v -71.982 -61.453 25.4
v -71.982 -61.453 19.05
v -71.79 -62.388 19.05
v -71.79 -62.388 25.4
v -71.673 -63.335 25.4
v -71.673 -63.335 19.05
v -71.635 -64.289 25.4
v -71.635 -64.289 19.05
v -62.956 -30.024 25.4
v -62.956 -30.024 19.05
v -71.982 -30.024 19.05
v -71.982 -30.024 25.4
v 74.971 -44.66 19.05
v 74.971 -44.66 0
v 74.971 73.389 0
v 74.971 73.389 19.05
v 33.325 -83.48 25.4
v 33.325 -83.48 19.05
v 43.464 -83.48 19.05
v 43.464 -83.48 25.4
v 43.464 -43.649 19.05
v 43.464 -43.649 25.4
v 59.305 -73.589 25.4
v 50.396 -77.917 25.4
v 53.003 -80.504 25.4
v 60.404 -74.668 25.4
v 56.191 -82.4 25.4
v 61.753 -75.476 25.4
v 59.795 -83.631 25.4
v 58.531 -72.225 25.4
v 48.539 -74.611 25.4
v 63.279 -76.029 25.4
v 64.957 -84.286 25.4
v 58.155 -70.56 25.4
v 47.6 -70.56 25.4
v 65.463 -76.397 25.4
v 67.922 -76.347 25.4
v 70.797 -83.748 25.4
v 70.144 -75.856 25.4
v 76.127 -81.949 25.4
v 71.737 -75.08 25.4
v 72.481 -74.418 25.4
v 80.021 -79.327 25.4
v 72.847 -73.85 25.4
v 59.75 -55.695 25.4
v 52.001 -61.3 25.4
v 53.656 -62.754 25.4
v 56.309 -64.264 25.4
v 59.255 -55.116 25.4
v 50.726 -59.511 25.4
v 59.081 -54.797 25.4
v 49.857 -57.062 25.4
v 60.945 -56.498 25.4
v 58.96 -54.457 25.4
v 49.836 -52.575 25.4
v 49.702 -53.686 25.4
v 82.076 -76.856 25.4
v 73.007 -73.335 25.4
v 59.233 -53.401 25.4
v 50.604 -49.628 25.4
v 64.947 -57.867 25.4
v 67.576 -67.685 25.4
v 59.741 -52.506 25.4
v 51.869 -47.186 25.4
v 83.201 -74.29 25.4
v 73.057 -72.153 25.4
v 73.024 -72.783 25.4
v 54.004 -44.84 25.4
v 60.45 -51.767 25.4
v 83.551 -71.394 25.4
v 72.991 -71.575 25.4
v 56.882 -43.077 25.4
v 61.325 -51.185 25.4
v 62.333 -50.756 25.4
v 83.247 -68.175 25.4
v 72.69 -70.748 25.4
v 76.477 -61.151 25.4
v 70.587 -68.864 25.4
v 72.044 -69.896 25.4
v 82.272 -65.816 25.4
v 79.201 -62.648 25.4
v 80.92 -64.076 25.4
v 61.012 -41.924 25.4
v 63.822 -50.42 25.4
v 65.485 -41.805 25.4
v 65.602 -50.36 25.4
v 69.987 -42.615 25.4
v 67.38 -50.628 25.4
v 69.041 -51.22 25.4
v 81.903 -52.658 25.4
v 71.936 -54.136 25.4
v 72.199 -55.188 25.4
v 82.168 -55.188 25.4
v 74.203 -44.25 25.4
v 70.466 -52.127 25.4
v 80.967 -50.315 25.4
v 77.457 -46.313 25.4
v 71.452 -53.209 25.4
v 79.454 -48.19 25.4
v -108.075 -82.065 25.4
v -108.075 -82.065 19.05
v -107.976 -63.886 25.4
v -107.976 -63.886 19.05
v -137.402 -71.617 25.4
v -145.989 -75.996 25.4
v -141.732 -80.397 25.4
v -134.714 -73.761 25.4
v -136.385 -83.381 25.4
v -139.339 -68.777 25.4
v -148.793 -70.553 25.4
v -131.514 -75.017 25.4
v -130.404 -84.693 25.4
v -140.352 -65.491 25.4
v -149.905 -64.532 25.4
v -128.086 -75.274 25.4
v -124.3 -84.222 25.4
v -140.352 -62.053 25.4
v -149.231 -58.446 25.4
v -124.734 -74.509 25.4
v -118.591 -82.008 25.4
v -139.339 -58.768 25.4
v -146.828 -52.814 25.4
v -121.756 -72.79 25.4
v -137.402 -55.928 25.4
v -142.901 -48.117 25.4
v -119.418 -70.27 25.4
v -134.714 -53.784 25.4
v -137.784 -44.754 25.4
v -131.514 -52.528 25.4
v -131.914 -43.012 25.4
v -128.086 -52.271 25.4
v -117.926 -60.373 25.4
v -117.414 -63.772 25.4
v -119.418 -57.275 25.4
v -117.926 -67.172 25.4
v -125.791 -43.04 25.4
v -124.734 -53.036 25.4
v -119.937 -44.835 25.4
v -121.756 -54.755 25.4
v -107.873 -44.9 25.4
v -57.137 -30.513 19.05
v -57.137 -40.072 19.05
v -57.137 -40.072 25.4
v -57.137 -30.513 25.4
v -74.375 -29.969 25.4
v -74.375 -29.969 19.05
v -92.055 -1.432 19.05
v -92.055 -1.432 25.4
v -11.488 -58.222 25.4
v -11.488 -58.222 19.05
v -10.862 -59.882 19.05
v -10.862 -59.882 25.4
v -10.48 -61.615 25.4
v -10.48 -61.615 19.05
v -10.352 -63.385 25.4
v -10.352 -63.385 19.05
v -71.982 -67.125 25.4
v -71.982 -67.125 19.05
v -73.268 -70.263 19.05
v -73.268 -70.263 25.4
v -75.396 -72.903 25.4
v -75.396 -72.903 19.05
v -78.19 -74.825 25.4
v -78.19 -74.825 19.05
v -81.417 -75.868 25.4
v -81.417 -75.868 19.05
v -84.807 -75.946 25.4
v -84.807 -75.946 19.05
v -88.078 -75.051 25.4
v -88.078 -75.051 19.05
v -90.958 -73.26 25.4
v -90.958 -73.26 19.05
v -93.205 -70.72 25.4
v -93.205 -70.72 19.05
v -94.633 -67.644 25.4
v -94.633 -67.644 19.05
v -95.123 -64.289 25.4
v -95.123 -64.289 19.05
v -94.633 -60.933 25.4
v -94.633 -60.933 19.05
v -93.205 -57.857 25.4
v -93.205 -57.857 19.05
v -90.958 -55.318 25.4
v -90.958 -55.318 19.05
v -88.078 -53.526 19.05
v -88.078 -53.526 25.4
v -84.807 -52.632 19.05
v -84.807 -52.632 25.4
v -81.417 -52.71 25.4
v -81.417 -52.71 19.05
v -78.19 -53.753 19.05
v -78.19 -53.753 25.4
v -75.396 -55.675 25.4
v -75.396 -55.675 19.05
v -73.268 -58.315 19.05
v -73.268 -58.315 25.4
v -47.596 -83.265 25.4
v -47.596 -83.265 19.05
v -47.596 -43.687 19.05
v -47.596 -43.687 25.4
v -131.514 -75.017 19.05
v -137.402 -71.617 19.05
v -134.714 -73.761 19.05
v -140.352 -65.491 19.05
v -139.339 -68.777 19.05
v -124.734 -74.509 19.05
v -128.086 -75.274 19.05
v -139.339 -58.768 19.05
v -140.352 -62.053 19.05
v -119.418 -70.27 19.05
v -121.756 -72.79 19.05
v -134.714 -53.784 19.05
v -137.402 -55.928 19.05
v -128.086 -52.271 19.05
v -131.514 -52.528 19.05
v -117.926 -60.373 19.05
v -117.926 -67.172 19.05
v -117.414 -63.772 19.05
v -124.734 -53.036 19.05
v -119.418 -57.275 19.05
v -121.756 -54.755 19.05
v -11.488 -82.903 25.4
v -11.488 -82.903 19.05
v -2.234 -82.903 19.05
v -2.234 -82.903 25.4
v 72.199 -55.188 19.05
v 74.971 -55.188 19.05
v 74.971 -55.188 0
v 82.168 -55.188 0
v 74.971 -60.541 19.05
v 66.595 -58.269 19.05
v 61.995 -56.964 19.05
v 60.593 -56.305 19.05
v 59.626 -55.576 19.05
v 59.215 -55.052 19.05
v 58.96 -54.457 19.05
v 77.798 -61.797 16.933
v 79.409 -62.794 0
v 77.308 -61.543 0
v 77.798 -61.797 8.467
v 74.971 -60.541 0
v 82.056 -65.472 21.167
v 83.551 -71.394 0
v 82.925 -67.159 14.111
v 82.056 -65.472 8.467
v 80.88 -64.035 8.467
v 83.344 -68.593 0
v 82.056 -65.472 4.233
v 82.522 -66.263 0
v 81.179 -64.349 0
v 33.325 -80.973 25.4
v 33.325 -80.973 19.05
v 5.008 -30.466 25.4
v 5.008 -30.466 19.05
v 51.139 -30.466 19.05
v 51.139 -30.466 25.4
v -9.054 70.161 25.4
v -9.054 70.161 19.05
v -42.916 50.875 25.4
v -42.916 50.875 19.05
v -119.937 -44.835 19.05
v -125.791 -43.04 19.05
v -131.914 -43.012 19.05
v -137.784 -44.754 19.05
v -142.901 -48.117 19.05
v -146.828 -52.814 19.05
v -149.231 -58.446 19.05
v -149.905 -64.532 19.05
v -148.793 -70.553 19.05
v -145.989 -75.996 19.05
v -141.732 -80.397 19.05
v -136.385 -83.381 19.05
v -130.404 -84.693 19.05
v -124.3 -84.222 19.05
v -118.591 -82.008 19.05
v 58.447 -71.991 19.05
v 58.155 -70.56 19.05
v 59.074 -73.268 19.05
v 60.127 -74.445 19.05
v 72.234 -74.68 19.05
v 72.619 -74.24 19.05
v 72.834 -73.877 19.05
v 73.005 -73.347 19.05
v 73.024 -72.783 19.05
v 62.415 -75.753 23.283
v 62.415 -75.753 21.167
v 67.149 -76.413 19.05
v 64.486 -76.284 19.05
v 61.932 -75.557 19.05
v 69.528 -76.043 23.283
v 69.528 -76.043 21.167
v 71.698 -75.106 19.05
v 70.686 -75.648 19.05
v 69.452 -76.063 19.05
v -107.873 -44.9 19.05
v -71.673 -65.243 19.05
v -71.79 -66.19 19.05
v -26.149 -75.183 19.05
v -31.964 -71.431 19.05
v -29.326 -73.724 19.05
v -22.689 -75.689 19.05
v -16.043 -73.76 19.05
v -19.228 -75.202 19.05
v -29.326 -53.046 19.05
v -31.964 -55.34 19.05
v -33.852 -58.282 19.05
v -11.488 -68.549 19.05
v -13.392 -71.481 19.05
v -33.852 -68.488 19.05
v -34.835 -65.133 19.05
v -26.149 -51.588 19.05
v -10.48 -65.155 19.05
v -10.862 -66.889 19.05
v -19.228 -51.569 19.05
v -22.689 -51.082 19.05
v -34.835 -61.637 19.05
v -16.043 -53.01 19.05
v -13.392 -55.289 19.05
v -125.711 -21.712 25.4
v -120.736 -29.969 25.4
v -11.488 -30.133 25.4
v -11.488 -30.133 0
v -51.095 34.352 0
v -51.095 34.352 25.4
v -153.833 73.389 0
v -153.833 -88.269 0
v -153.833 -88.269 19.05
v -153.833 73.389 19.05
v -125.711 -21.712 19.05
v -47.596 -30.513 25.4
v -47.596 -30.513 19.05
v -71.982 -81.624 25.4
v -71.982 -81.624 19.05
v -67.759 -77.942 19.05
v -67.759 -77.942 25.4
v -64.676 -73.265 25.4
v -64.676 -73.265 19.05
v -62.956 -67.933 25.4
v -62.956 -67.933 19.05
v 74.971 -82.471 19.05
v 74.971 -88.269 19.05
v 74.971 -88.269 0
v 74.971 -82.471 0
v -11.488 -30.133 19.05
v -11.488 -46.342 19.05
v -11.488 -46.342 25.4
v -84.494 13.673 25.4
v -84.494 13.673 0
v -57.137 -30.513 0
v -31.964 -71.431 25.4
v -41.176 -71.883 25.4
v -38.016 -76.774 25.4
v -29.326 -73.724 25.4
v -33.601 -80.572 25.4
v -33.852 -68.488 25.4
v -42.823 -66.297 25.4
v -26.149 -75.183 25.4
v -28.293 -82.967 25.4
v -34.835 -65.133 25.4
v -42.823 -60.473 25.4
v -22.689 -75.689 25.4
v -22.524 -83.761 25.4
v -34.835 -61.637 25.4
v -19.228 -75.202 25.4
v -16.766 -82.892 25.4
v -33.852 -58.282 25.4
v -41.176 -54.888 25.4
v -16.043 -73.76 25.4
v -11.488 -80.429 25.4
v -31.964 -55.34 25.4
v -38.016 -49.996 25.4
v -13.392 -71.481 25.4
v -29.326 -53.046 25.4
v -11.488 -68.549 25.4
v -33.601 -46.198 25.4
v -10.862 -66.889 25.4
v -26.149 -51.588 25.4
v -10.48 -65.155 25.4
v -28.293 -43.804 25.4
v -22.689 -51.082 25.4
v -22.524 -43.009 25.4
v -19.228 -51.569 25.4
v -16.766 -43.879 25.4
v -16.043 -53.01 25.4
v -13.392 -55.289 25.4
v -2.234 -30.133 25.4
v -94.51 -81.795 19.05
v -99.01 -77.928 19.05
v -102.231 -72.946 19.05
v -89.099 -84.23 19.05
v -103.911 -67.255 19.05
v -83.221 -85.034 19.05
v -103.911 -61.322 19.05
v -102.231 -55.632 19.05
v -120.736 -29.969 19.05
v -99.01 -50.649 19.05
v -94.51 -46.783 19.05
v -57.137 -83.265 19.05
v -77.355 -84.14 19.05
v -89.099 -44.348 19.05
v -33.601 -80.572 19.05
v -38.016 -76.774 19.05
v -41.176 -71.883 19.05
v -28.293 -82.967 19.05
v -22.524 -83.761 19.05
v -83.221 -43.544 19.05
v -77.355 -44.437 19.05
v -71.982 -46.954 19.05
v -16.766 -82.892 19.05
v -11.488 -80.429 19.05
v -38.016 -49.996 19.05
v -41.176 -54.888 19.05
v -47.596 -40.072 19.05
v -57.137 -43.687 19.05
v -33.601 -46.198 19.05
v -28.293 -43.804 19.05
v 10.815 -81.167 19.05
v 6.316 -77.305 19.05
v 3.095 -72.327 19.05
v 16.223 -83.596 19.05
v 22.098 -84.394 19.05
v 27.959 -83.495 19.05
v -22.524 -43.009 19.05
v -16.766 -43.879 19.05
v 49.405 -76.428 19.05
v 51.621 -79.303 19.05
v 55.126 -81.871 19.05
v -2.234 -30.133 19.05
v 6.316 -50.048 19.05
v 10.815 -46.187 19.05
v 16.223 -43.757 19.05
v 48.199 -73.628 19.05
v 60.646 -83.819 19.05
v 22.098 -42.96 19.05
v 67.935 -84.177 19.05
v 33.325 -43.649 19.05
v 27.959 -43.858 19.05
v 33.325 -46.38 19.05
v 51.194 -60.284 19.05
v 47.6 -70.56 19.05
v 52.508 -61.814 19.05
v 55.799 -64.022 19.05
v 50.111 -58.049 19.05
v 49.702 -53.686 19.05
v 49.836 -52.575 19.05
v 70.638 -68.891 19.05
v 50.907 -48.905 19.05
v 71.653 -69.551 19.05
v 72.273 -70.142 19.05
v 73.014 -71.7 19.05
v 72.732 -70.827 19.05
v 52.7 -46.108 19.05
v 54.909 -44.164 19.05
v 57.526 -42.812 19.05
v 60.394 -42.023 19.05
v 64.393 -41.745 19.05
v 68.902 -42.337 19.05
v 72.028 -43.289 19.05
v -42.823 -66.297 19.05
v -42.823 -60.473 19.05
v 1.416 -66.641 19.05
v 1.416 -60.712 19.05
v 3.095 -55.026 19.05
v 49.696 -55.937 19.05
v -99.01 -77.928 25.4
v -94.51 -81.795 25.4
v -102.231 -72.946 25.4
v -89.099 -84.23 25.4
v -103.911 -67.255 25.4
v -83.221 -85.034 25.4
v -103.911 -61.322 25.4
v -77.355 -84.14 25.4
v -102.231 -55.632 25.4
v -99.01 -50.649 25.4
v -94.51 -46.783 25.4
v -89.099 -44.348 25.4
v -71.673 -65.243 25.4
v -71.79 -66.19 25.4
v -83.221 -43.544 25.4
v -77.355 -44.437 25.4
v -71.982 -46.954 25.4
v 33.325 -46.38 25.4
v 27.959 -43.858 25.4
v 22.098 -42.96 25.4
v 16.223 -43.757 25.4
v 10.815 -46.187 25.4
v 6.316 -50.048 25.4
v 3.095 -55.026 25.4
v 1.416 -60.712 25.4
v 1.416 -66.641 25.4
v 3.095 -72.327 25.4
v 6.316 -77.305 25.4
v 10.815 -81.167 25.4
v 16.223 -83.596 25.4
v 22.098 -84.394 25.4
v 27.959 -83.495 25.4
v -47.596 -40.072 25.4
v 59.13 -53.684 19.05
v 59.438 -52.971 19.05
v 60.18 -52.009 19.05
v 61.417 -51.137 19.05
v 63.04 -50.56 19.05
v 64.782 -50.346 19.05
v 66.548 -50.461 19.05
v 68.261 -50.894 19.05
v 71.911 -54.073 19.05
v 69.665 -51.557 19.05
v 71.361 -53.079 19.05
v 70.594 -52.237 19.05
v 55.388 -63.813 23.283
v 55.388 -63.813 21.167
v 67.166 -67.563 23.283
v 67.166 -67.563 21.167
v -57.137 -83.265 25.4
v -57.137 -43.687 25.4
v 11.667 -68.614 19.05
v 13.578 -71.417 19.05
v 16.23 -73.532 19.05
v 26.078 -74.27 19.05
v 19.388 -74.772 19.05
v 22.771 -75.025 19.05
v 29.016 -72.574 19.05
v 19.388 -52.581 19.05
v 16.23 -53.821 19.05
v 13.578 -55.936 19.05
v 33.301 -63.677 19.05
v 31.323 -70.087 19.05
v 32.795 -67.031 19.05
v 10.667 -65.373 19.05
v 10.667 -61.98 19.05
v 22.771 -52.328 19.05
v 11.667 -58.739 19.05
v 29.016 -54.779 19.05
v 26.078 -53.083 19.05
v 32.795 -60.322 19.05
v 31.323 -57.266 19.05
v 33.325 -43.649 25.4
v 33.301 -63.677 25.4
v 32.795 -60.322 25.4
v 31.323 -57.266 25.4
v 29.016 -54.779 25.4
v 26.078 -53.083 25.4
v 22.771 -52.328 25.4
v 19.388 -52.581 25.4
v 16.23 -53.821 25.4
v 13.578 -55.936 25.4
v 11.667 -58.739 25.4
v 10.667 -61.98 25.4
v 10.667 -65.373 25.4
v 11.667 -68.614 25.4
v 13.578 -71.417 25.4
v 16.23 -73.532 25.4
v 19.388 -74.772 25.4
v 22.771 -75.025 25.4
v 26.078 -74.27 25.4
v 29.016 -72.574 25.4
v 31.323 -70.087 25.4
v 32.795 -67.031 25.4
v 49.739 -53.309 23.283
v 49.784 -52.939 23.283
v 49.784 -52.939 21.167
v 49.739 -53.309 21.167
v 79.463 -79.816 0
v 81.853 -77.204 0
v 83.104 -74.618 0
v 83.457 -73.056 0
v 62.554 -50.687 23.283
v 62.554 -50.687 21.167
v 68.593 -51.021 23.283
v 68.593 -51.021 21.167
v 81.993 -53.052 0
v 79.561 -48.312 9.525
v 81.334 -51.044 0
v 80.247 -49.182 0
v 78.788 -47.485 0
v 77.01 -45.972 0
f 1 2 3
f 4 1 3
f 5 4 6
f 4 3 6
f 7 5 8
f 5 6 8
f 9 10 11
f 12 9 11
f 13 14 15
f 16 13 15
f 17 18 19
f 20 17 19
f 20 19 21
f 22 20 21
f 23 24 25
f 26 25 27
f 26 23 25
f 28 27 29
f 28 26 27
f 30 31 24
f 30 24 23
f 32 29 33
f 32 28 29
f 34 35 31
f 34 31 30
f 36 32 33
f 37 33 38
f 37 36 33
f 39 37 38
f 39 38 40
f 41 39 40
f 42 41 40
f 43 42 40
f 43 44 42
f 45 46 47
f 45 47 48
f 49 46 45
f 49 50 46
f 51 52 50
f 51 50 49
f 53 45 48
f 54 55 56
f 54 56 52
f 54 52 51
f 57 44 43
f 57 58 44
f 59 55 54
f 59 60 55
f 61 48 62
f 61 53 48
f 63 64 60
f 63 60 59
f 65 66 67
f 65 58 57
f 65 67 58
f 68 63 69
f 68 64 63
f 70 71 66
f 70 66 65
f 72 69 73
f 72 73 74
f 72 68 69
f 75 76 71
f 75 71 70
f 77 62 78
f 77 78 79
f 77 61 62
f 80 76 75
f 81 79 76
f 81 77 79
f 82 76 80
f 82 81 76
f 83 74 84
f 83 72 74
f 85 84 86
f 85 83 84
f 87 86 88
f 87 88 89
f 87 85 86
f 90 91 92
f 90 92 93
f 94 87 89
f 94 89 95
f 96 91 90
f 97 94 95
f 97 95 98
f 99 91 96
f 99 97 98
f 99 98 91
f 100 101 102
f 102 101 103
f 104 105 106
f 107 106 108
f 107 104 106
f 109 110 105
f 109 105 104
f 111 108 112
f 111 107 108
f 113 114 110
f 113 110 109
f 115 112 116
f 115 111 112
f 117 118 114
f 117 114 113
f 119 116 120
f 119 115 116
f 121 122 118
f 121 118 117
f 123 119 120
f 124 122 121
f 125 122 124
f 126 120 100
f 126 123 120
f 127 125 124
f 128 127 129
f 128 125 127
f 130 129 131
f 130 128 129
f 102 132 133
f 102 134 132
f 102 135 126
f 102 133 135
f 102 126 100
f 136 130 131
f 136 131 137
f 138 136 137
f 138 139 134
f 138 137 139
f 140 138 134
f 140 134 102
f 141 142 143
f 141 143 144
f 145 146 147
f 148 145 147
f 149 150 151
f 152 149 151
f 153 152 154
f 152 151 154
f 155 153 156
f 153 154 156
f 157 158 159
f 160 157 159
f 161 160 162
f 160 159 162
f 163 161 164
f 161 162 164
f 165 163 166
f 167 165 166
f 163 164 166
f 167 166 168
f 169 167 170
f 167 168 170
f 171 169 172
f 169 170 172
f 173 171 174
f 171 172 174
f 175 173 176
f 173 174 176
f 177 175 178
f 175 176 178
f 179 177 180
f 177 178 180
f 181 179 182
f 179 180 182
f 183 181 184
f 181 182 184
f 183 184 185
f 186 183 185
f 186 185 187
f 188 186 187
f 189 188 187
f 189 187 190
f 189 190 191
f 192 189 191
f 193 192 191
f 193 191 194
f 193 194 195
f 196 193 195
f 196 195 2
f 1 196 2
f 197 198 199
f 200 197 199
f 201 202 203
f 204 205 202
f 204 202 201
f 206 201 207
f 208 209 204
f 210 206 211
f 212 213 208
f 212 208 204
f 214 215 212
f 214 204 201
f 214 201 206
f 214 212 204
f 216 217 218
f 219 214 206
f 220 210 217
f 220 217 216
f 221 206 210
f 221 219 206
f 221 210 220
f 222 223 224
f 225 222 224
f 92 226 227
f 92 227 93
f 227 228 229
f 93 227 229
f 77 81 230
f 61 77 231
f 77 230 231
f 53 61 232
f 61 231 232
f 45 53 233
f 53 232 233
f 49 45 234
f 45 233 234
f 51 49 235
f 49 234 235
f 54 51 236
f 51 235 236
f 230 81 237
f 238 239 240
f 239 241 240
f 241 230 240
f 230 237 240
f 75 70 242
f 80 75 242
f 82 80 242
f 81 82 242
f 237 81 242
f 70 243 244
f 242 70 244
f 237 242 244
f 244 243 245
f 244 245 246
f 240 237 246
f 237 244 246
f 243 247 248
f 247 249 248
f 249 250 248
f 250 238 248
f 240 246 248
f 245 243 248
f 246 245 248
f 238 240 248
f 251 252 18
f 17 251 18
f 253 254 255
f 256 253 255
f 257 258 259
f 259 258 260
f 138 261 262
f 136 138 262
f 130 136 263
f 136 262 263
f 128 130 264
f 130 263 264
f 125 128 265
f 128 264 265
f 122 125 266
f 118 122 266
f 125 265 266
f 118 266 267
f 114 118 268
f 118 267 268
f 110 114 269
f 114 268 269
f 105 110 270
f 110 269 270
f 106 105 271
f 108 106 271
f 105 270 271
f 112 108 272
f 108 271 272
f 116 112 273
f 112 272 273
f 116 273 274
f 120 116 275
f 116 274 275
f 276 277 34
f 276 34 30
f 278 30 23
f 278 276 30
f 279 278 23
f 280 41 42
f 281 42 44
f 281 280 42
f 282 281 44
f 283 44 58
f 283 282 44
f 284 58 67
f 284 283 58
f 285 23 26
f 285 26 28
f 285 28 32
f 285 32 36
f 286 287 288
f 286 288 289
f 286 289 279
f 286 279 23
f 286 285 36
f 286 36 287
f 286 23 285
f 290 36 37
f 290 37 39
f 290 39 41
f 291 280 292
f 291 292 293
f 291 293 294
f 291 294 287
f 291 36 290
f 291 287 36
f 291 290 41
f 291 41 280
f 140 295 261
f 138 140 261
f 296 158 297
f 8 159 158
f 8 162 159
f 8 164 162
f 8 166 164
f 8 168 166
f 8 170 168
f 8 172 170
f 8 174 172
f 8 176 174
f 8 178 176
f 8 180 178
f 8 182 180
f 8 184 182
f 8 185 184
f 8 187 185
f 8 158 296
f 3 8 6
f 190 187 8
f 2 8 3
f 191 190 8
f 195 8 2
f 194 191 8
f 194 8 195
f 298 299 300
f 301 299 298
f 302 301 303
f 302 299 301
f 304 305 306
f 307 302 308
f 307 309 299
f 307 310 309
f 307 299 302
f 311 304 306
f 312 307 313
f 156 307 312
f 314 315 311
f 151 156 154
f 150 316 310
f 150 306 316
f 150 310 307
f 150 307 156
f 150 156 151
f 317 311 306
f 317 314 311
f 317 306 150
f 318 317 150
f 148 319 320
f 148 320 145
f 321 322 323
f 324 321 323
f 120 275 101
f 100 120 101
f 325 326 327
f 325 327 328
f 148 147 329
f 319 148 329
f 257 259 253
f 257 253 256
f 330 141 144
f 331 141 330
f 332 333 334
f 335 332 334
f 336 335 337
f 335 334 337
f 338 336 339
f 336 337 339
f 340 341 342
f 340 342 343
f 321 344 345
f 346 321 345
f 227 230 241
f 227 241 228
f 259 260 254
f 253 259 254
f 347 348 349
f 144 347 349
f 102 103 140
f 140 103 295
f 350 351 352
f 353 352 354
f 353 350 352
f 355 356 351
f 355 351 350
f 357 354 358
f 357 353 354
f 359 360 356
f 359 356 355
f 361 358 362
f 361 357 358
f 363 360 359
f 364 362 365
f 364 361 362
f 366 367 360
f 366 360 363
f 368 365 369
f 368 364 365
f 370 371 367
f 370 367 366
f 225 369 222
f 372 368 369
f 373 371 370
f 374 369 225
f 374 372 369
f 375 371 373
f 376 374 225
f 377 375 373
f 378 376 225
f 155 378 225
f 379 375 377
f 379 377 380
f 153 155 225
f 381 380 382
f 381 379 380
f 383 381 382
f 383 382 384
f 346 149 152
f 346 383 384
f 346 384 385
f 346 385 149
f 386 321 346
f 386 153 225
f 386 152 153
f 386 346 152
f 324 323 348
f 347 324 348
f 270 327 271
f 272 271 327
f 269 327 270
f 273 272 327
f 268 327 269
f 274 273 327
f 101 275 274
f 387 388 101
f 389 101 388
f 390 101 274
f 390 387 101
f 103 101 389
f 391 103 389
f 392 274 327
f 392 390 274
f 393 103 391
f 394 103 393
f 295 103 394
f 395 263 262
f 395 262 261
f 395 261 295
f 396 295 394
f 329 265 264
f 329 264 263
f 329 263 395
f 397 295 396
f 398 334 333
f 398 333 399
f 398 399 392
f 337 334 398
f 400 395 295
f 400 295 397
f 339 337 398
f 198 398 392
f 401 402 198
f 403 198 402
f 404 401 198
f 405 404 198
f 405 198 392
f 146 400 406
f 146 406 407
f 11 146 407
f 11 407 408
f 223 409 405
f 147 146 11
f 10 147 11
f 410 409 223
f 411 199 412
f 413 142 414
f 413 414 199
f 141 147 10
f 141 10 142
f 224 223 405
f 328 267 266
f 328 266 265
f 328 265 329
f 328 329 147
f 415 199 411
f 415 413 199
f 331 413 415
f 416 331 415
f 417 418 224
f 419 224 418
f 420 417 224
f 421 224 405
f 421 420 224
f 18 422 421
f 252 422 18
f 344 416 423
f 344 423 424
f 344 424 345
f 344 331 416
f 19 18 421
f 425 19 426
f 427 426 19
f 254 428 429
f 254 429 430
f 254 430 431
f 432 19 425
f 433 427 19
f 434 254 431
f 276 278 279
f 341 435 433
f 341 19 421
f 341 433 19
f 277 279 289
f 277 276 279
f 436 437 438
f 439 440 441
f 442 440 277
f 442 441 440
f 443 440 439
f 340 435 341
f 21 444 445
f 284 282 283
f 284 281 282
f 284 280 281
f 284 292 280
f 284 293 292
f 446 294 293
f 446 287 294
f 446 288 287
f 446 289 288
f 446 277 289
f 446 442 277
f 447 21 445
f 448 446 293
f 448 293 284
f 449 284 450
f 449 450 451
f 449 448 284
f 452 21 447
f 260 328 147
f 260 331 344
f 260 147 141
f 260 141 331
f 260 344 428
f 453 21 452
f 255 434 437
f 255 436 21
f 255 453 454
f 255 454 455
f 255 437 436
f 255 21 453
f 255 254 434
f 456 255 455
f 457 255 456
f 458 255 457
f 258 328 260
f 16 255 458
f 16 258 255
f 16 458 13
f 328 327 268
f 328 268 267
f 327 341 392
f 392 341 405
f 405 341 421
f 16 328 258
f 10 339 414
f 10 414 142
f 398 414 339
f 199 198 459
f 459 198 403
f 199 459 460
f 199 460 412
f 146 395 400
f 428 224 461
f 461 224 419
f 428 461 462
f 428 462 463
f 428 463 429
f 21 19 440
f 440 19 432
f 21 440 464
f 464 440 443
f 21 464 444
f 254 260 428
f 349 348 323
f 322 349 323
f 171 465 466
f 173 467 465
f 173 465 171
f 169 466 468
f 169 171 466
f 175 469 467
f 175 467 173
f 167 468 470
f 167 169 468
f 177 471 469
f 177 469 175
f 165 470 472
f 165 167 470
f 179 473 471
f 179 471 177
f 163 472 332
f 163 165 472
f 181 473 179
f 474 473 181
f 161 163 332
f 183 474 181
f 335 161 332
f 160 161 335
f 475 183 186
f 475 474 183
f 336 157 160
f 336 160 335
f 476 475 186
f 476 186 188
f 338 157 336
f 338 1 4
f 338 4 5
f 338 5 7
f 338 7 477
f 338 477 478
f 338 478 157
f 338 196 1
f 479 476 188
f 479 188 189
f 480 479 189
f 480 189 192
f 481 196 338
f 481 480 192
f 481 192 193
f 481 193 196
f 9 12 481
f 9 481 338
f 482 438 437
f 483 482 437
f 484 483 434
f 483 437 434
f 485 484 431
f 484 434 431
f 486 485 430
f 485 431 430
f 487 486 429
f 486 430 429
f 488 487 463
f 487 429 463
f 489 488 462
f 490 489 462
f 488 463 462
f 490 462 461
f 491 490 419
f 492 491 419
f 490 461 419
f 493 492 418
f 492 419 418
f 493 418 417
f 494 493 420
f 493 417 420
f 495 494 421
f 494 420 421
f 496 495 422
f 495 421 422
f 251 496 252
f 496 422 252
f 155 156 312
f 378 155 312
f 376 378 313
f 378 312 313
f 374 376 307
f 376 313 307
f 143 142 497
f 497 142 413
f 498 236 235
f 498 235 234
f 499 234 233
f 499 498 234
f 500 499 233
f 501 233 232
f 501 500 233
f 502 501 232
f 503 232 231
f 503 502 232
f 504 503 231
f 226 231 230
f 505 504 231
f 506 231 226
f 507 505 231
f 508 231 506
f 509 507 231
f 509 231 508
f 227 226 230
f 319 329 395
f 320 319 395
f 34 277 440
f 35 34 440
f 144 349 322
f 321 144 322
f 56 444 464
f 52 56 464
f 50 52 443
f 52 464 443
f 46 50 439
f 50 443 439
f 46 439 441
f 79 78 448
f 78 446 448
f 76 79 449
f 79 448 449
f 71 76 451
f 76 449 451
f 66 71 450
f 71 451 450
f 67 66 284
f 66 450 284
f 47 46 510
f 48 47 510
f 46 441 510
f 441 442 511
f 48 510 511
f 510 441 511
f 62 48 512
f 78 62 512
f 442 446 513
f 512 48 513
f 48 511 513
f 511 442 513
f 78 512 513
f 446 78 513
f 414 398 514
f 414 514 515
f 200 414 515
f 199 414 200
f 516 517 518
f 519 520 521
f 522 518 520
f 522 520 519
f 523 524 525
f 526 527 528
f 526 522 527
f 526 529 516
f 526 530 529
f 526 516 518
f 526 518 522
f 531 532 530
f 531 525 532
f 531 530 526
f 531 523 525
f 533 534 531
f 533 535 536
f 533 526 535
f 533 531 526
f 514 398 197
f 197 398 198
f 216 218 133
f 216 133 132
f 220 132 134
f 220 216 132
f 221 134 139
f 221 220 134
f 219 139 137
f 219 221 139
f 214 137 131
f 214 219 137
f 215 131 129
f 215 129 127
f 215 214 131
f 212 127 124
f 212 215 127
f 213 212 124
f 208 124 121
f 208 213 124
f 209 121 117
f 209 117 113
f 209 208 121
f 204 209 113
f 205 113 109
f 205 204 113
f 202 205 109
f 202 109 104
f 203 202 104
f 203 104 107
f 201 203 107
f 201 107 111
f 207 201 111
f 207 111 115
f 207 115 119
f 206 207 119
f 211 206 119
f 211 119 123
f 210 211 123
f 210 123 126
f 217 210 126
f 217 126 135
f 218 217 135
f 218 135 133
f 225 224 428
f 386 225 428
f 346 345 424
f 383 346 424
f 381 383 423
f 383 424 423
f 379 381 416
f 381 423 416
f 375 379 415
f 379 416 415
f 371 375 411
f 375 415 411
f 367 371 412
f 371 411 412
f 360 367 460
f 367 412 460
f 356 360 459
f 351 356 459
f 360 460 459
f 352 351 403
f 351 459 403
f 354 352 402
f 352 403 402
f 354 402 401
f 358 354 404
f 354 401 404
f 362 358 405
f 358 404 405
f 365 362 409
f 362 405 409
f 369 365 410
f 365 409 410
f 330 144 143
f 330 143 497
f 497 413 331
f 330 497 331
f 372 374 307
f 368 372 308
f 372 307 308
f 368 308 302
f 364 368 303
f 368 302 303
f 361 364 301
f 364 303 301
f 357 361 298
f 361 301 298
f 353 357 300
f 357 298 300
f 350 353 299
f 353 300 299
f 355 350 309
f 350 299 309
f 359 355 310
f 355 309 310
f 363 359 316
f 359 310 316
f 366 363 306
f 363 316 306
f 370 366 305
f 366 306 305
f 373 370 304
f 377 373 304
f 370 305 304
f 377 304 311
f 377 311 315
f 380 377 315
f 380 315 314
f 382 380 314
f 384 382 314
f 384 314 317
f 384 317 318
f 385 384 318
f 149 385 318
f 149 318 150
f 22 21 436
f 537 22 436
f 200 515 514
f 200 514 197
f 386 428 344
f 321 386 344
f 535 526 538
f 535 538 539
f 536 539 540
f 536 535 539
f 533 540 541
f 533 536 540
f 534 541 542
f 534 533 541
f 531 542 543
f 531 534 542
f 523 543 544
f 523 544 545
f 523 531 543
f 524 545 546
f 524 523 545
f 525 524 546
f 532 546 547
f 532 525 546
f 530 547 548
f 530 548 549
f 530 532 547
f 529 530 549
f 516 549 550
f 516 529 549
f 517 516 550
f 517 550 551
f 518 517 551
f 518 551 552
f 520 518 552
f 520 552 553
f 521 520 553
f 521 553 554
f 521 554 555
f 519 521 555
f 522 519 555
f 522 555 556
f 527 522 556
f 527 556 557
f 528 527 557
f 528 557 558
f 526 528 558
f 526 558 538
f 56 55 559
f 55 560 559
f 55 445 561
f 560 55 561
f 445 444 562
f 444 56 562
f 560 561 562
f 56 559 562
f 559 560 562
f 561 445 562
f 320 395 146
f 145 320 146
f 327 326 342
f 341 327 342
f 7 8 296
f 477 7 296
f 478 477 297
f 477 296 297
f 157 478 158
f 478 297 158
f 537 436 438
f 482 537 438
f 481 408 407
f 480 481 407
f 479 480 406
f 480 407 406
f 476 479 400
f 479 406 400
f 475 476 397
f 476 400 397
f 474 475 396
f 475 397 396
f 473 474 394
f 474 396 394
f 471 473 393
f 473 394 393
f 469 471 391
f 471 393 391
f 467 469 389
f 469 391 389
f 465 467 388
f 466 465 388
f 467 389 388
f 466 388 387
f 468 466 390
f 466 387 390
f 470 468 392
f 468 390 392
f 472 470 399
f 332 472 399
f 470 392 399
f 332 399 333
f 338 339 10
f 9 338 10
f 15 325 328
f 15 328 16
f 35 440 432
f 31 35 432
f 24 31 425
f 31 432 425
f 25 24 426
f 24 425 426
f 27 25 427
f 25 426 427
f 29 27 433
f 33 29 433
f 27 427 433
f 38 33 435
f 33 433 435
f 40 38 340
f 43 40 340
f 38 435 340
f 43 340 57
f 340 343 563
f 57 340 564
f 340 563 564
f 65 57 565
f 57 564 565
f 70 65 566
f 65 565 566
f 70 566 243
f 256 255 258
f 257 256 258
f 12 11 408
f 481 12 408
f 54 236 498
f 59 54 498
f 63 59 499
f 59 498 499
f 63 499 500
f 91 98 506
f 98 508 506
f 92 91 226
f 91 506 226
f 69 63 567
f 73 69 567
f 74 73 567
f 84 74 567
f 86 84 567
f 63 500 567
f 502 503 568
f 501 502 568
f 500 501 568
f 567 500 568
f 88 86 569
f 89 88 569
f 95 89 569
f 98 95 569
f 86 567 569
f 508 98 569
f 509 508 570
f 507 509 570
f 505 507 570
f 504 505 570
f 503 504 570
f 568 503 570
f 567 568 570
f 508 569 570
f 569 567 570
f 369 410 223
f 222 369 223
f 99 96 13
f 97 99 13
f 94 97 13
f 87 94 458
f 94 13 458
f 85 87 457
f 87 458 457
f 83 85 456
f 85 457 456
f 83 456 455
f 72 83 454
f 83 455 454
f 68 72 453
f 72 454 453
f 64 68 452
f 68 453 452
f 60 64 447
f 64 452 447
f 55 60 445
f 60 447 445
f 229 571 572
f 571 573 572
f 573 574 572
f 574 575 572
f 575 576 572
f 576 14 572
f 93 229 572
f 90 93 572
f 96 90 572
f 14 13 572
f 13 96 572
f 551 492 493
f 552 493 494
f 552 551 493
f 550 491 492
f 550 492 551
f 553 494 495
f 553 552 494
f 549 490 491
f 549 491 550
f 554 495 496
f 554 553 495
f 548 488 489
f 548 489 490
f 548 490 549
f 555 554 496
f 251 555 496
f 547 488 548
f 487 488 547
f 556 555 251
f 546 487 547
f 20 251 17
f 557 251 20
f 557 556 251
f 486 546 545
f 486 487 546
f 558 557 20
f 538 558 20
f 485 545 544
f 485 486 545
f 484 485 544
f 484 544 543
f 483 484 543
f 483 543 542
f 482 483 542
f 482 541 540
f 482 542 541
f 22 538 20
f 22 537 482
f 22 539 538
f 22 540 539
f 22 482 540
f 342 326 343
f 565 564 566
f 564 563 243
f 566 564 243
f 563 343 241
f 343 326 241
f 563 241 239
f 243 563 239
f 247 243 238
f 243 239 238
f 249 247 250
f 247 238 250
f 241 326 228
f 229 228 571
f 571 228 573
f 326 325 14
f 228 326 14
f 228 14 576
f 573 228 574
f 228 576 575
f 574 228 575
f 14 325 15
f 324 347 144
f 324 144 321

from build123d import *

# Parameters (mm, degrees)
F2_DEPTH = 25.4
F0_R     = 11.5336925559
F0_W     = 9.541330096
F0_H     = 39.5781323314
F0_R_2   = 11.380629632
F0_H_2   = 9.5591302517
F1_W     = 228.8039848208
F1_H     = 161.6584509611
F3_DEPTH = 19.05


with BuildPart() as f2:
    # F0 (on Top) → F2 (new body)
    with BuildSketch(Plane.XY):
        Polygon((-51.0945059359, 34.3518182635), (-84.4939826515, 13.6732111501), (-57.1369986801, -30.5129830238), (-11.4884115756, -30.1327314228), align=None)
    extrude(amount=F2_DEPTH)


with BuildPart() as f2b:
    # F0 (on Top) → F2, piece 2 (new body)
    with BuildSketch(Plane.XY):
        with BuildLine():
            ThreePointArc((-107.9762237087, -63.8860243261), (-107.9759929518, -63.8292248991), (-107.9759160326, -63.7724250555))
            ThreePointArc((-107.9759160326, -63.7724250555), (-111.2166703627, -52.5731037336), (-119.9373394473, -44.8350666817))
            ThreePointArc((-119.9373394473, -44.8350666817), (-149.9052734682, -64.5315465682), (-118.5908724142, -82.0082932916))
            ThreePointArc((-118.5908724142, -82.0082932916), (-110.851541588, -74.3716434809), (-107.9762237087, -63.8860243261))
        make_face()
        with Locations((-128.9474666119, -63.7724250555)):
            Circle(F0_R, mode=Mode.SUBTRACT)
        with BuildLine():
            ThreePointArc((-119.9373394473, -44.8350666817), (-111.2166703627, -52.5731037336), (-107.9759160326, -63.7724250555))
            ThreePointArc((-107.9759160326, -63.7724250555), (-107.9759929518, -63.8292248991), (-107.9762237087, -63.8860243261))
            Line((-107.9762237087, -63.8860243261), (-107.8733798367, -44.9004164099))
            Line((-107.8733798367, -44.9004164099), (-119.9373394473, -44.8350666817))
        make_face()
        with BuildLine():
            Line((-108.074699505, -82.0652587543), (-107.9762237087, -63.8860243261))
            ThreePointArc((-107.9762237087, -63.8860243261), (-110.851541588, -74.3716434809), (-118.5908724142, -82.0082932916))
            Line((-118.5908724142, -82.0082932916), (-108.074699505, -82.0652587543))
        make_face()
    extrude(amount=F2_DEPTH)



with BuildPart() as f2c:
    # F0 (on Top) → F2, piece 3 (new body)
    with BuildSketch(Plane.XY):
        Polygon((-92.0550826628, -1.4315552488), (-125.7108291716, -21.712434453), (-120.7355512429, -29.968816787), (-74.3747093637, -29.968816787), align=None)
    extrude(amount=F2_DEPTH)


with BuildPart() as f2d:
    # F0 (on Top) → F2, piece 4 (new body)
    with BuildSketch(Plane.XY):
        with BuildLine():
            ThreePointArc((-62.9558414221, -60.6451802377), (-66.0588539194, -52.8699310888), (-71.9823092222, -46.9542009427))
            Line((-71.9823092222, -46.9542009427), (-71.9823092222, -61.4527142385))
            ThreePointArc((-71.9823092222, -61.4527142385), (-71.7219259683, -62.8601804955), (-71.6346996434, -64.2888695002))
            ThreePointArc((-71.6346996434, -64.2888695002), (-71.7219259683, -65.7175585048), (-71.9823092222, -67.1250247618))
            Line((-71.9823092222, -67.1250247618), (-71.9823092222, -81.6235380576))
            ThreePointArc((-71.9823092222, -81.6235380576), (-66.0588539194, -75.7078079115), (-62.9558414221, -67.9325587626))
            Line((-62.9558414221, -67.9325587626), (-62.9558414221, -60.6451802377))
        make_face()
        with BuildLine():
            Line((-62.9558414221, -30.0241652876), (-71.9823092222, -30.0241652876))
            Line((-71.9823092222, -30.0241652876), (-71.9823092222, -46.9542009427))
            ThreePointArc((-71.9823092222, -46.9542009427), (-66.0588539194, -52.8699310888), (-62.9558414221, -60.6451802377))
            Line((-62.9558414221, -60.6451802377), (-62.9558414221, -30.0241652876))
        make_face()
        with BuildLine():
            Line((-71.9823092222, -61.4527142385), (-71.9823092222, -46.9542009427))
            ThreePointArc((-71.9823092222, -46.9542009427), (-104.1239235622, -64.2888695002), (-71.9823092222, -81.6235380576))
            Line((-71.9823092222, -81.6235380576), (-71.9823092222, -67.1250247618))
            ThreePointArc((-71.9823092222, -67.1250247618), (-95.1225710504, -64.2888695002), (-71.9823092222, -61.4527142385))
        make_face()
    extrude(amount=F2_DEPTH)


with BuildPart() as f2e:
    # F0 (on Top) → F2, piece 5 (new body)
    with BuildSketch(Plane.XY):
        with Locations((-52.3663336321, -63.4756200016)):
            Rectangle(F0_W, F0_H)
    extrude(amount=F2_DEPTH)


with BuildPart() as f2f:
    # F0 (on Top) → F2, piece 6 (new body)
    with BuildSketch(Plane.XY):
        with BuildLine():
            Line((-2.2344286554, -30.1327314228), (-11.4884115756, -30.1327314228))
            Line((-11.4884115756, -30.1327314228), (-11.4884115756, -46.3416812132))
            ThreePointArc((-11.4884115756, -46.3416812132), (-4.7290138195, -53.6991112265), (-2.2795860101, -63.3852630854))
            ThreePointArc((-2.2795860101, -63.3852630854), (-4.7290138195, -73.0714149442), (-11.4884115756, -80.4288449576))
            Line((-11.4884115756, -80.4288449576), (-11.4884115756, -82.9032436013))
            Line((-11.4884115756, -82.9032436013), (-2.2344286554, -82.9032436013))
            Line((-2.2344286554, -82.9032436013), (-2.2344286554, -30.1327314228))
        make_face()
        with BuildLine():
            Line((-11.4884115756, -58.2216957499), (-11.4884115756, -46.3416812132))
            ThreePointArc((-11.4884115756, -46.3416812132), (-43.0324647199, -63.3852630854), (-11.4884115756, -80.4288449576))
            Line((-11.4884115756, -80.4288449576), (-11.4884115756, -68.5488304208))
            ThreePointArc((-11.4884115756, -68.5488304208), (-34.959603112, -63.3852630854), (-11.4884115756, -58.2216957499))
        make_face()
        with BuildLine():
            ThreePointArc((-2.2795860101, -63.3852630854), (-4.7290138195, -53.6991112265), (-11.4884115756, -46.3416812132))
            Line((-11.4884115756, -46.3416812132), (-11.4884115756, -58.2216957499))
            ThreePointArc((-11.4884115756, -58.2216957499), (-10.639794053, -60.7417407315), (-10.3524476179, -63.3852630854))
            ThreePointArc((-10.3524476179, -63.3852630854), (-10.639794053, -66.0287854392), (-11.4884115756, -68.5488304208))
            Line((-11.4884115756, -68.5488304208), (-11.4884115756, -80.4288449576))
            ThreePointArc((-11.4884115756, -80.4288449576), (-4.7290138195, -73.0714149442), (-2.2795860101, -63.3852630854))
        make_face()
    extrude(amount=F2_DEPTH)


with BuildPart() as f2g:
    # F0 (on Top) → F2, piece 7 (new body)
    with BuildSketch(Plane.XY):
        with BuildLine():
            Line((33.3248190582, -80.9727901538), (33.3248190582, -46.3803267161))
            ThreePointArc((33.3248190582, -46.3803267161), (1.2023110457, -63.676558435), (33.3248190582, -80.9727901538))
        make_face()
        with Locations((21.920107305, -63.676558435)):
            Circle(F0_R_2, mode=Mode.SUBTRACT)
        with BuildLine():
            ThreePointArc((33.3248190582, -80.9727901538), (40.1616474859, -73.4986403768), (42.6379035644, -63.676558435))
            ThreePointArc((42.6379035644, -63.676558435), (40.1616474859, -53.8544764931), (33.3248190582, -46.3803267161))
            Line((33.3248190582, -46.3803267161), (33.3248190582, -80.9727901538))
        make_face()
        with BuildLine():
            ThreePointArc((33.3248190582, -46.3803267161), (40.1616474859, -53.8544764931), (42.6379035644, -63.676558435))
            ThreePointArc((42.6379035644, -63.676558435), (40.1616474859, -73.4986403768), (33.3248190582, -80.9727901538))
            Line((33.3248190582, -80.9727901538), (33.3248190582, -83.4800675511))
            Line((33.3248190582, -83.4800675511), (43.4636287391, -83.4800675511))
            Line((43.4636287391, -83.4800675511), (43.4636287391, -43.6490178108))
            Line((43.4636287391, -43.6490178108), (33.3248190582, -43.6490178108))
            Line((33.3248190582, -43.6490178108), (33.3248190582, -46.3803267161))
        make_face()
    extrude(amount=F2_DEPTH)


with BuildPart() as f2h:
    # F0 (on Top) → F2, piece 8 (new body)
    with BuildSketch(Plane.XY):
        with BuildLine():
            Line((58.1554566098, -70.5598088785), (47.5999824703, -70.5598088785))
            add(Edge.make_bspline(
                [(47.5999824703, -70.5598088785), (49.5010092854, -90.3848129197), (83.9333076226, -87.0293162841), (83.5507873642, -71.3937439102)],
                knots=[0, 0, 0, 0, 35.9604758055, 35.9604758055, 35.9604758055, 35.9604758055], degree=3))
            add(Edge.make_bspline(
                [(83.5507873642, -71.3937439102), (84.1839209979, -56.8009070249), (60.4972094297, -60.2178759873), (58.9604414999, -54.456923157)],
                knots=[0, 0, 0, 0, 29.8586839454, 29.8586839454, 29.8586839454, 29.8586839454], degree=3))
            add(Edge.make_bspline(
                [(58.9604414999, -54.456923157), (59.7041723272, -48.5431283295), (71.4366002474, -49.1966214378), (72.1989516421, -55.1880527146)],
                knots=[0, 0, 0, 0, 13.2095221181, 13.2095221181, 13.2095221181, 13.2095221181], degree=3))
            Line((72.1989516421, -55.1880527146), (82.1682080838, -55.1880527146))
            add(Edge.make_bspline(
                [(82.1682080838, -55.1880527146), (82.6870746879, -41.6859303163), (52.6399704235, -34.4332249736), (49.8361763634, -52.5753086121)],
                knots=[0, 0, 0, 0, 31.868338701, 31.868338701, 31.868338701, 31.868338701], degree=3))
            add(Edge.make_bspline(
                [(49.8361763634, -52.5753086121), (49.7805065758, -52.9355226367), (49.7355768501, -53.3057479852), (49.7018396854, -53.6861345172)],
                knots=[31.868338701, 31.868338701, 31.868338701, 31.868338701, 32.5010897548, 32.5010897548, 32.5010897548, 32.5010897548], degree=3))
            add(Edge.make_bspline(
                [(49.7018396854, -53.6861345172), (48.3377947774, -69.6180662759), (74.1305380627, -64.2111304974), (73.0244419212, -72.7832366078)],
                knots=[0.6783402198, 0.6783402198, 0.6783402198, 0.6783402198, 30.7580235623, 30.7580235623, 30.7580235623, 30.7580235623], degree=3))
            add(Edge.make_bspline(
                [(58.1554566098, -70.5598088785), (58.8323771954, -78.6550715566), (73.4929313503, -77.367492494), (73.0244419212, -72.7832366078)],
                knots=[0, 0, 0, 0, 15.0343059386, 15.0343059386, 15.0343059386, 15.0343059386], degree=3))
        make_face()
    extrude(amount=F2_DEPTH)


with BuildPart() as f2i:
    # F0 (on Top) → F2, piece 9 (new body)
    with BuildSketch(Plane.XY):
        Polygon((-9.054414928, 70.1610743999), (-42.9158993065, 50.8752018213), (5.0083836541, -30.4661039263), (51.1389710009, -30.4661039263), align=None)
    extrude(amount=F2_DEPTH)


with BuildPart() as f2j:
    # F0 (on Top) → F2, piece 10 (new body)
    with BuildSketch(Plane.XY):
        with Locations((-52.3663336321, -35.2925481497)):
            Rectangle(F0_W, F0_H_2)
    extrude(amount=F2_DEPTH)


with BuildPart() as f2b_1:
    add(f2b.part)

    add(f2c.part)  # F3 merges F2c

    add(f2d.part)  # F3 merges F2d

    add(f2e.part)  # F3 merges F2e

    add(f2f.part)  # F3 merges F2f

    add(f2g.part)  # F3 merges F2g

    add(f2h.part)  # F3 merges F2h

    add(f2i.part)  # F3 merges F2i

    add(f2j.part)  # F3 merges F2j
    # F1 (on Top) → F3 (join)
    with BuildSketch(Plane.XY):
        with Locations((-39.4312478602, -7.4402168393)):
            Rectangle(F1_W, F1_H)
    extrude(amount=F3_DEPTH)


solid = Compound([f2.part, f2b_1.part])
